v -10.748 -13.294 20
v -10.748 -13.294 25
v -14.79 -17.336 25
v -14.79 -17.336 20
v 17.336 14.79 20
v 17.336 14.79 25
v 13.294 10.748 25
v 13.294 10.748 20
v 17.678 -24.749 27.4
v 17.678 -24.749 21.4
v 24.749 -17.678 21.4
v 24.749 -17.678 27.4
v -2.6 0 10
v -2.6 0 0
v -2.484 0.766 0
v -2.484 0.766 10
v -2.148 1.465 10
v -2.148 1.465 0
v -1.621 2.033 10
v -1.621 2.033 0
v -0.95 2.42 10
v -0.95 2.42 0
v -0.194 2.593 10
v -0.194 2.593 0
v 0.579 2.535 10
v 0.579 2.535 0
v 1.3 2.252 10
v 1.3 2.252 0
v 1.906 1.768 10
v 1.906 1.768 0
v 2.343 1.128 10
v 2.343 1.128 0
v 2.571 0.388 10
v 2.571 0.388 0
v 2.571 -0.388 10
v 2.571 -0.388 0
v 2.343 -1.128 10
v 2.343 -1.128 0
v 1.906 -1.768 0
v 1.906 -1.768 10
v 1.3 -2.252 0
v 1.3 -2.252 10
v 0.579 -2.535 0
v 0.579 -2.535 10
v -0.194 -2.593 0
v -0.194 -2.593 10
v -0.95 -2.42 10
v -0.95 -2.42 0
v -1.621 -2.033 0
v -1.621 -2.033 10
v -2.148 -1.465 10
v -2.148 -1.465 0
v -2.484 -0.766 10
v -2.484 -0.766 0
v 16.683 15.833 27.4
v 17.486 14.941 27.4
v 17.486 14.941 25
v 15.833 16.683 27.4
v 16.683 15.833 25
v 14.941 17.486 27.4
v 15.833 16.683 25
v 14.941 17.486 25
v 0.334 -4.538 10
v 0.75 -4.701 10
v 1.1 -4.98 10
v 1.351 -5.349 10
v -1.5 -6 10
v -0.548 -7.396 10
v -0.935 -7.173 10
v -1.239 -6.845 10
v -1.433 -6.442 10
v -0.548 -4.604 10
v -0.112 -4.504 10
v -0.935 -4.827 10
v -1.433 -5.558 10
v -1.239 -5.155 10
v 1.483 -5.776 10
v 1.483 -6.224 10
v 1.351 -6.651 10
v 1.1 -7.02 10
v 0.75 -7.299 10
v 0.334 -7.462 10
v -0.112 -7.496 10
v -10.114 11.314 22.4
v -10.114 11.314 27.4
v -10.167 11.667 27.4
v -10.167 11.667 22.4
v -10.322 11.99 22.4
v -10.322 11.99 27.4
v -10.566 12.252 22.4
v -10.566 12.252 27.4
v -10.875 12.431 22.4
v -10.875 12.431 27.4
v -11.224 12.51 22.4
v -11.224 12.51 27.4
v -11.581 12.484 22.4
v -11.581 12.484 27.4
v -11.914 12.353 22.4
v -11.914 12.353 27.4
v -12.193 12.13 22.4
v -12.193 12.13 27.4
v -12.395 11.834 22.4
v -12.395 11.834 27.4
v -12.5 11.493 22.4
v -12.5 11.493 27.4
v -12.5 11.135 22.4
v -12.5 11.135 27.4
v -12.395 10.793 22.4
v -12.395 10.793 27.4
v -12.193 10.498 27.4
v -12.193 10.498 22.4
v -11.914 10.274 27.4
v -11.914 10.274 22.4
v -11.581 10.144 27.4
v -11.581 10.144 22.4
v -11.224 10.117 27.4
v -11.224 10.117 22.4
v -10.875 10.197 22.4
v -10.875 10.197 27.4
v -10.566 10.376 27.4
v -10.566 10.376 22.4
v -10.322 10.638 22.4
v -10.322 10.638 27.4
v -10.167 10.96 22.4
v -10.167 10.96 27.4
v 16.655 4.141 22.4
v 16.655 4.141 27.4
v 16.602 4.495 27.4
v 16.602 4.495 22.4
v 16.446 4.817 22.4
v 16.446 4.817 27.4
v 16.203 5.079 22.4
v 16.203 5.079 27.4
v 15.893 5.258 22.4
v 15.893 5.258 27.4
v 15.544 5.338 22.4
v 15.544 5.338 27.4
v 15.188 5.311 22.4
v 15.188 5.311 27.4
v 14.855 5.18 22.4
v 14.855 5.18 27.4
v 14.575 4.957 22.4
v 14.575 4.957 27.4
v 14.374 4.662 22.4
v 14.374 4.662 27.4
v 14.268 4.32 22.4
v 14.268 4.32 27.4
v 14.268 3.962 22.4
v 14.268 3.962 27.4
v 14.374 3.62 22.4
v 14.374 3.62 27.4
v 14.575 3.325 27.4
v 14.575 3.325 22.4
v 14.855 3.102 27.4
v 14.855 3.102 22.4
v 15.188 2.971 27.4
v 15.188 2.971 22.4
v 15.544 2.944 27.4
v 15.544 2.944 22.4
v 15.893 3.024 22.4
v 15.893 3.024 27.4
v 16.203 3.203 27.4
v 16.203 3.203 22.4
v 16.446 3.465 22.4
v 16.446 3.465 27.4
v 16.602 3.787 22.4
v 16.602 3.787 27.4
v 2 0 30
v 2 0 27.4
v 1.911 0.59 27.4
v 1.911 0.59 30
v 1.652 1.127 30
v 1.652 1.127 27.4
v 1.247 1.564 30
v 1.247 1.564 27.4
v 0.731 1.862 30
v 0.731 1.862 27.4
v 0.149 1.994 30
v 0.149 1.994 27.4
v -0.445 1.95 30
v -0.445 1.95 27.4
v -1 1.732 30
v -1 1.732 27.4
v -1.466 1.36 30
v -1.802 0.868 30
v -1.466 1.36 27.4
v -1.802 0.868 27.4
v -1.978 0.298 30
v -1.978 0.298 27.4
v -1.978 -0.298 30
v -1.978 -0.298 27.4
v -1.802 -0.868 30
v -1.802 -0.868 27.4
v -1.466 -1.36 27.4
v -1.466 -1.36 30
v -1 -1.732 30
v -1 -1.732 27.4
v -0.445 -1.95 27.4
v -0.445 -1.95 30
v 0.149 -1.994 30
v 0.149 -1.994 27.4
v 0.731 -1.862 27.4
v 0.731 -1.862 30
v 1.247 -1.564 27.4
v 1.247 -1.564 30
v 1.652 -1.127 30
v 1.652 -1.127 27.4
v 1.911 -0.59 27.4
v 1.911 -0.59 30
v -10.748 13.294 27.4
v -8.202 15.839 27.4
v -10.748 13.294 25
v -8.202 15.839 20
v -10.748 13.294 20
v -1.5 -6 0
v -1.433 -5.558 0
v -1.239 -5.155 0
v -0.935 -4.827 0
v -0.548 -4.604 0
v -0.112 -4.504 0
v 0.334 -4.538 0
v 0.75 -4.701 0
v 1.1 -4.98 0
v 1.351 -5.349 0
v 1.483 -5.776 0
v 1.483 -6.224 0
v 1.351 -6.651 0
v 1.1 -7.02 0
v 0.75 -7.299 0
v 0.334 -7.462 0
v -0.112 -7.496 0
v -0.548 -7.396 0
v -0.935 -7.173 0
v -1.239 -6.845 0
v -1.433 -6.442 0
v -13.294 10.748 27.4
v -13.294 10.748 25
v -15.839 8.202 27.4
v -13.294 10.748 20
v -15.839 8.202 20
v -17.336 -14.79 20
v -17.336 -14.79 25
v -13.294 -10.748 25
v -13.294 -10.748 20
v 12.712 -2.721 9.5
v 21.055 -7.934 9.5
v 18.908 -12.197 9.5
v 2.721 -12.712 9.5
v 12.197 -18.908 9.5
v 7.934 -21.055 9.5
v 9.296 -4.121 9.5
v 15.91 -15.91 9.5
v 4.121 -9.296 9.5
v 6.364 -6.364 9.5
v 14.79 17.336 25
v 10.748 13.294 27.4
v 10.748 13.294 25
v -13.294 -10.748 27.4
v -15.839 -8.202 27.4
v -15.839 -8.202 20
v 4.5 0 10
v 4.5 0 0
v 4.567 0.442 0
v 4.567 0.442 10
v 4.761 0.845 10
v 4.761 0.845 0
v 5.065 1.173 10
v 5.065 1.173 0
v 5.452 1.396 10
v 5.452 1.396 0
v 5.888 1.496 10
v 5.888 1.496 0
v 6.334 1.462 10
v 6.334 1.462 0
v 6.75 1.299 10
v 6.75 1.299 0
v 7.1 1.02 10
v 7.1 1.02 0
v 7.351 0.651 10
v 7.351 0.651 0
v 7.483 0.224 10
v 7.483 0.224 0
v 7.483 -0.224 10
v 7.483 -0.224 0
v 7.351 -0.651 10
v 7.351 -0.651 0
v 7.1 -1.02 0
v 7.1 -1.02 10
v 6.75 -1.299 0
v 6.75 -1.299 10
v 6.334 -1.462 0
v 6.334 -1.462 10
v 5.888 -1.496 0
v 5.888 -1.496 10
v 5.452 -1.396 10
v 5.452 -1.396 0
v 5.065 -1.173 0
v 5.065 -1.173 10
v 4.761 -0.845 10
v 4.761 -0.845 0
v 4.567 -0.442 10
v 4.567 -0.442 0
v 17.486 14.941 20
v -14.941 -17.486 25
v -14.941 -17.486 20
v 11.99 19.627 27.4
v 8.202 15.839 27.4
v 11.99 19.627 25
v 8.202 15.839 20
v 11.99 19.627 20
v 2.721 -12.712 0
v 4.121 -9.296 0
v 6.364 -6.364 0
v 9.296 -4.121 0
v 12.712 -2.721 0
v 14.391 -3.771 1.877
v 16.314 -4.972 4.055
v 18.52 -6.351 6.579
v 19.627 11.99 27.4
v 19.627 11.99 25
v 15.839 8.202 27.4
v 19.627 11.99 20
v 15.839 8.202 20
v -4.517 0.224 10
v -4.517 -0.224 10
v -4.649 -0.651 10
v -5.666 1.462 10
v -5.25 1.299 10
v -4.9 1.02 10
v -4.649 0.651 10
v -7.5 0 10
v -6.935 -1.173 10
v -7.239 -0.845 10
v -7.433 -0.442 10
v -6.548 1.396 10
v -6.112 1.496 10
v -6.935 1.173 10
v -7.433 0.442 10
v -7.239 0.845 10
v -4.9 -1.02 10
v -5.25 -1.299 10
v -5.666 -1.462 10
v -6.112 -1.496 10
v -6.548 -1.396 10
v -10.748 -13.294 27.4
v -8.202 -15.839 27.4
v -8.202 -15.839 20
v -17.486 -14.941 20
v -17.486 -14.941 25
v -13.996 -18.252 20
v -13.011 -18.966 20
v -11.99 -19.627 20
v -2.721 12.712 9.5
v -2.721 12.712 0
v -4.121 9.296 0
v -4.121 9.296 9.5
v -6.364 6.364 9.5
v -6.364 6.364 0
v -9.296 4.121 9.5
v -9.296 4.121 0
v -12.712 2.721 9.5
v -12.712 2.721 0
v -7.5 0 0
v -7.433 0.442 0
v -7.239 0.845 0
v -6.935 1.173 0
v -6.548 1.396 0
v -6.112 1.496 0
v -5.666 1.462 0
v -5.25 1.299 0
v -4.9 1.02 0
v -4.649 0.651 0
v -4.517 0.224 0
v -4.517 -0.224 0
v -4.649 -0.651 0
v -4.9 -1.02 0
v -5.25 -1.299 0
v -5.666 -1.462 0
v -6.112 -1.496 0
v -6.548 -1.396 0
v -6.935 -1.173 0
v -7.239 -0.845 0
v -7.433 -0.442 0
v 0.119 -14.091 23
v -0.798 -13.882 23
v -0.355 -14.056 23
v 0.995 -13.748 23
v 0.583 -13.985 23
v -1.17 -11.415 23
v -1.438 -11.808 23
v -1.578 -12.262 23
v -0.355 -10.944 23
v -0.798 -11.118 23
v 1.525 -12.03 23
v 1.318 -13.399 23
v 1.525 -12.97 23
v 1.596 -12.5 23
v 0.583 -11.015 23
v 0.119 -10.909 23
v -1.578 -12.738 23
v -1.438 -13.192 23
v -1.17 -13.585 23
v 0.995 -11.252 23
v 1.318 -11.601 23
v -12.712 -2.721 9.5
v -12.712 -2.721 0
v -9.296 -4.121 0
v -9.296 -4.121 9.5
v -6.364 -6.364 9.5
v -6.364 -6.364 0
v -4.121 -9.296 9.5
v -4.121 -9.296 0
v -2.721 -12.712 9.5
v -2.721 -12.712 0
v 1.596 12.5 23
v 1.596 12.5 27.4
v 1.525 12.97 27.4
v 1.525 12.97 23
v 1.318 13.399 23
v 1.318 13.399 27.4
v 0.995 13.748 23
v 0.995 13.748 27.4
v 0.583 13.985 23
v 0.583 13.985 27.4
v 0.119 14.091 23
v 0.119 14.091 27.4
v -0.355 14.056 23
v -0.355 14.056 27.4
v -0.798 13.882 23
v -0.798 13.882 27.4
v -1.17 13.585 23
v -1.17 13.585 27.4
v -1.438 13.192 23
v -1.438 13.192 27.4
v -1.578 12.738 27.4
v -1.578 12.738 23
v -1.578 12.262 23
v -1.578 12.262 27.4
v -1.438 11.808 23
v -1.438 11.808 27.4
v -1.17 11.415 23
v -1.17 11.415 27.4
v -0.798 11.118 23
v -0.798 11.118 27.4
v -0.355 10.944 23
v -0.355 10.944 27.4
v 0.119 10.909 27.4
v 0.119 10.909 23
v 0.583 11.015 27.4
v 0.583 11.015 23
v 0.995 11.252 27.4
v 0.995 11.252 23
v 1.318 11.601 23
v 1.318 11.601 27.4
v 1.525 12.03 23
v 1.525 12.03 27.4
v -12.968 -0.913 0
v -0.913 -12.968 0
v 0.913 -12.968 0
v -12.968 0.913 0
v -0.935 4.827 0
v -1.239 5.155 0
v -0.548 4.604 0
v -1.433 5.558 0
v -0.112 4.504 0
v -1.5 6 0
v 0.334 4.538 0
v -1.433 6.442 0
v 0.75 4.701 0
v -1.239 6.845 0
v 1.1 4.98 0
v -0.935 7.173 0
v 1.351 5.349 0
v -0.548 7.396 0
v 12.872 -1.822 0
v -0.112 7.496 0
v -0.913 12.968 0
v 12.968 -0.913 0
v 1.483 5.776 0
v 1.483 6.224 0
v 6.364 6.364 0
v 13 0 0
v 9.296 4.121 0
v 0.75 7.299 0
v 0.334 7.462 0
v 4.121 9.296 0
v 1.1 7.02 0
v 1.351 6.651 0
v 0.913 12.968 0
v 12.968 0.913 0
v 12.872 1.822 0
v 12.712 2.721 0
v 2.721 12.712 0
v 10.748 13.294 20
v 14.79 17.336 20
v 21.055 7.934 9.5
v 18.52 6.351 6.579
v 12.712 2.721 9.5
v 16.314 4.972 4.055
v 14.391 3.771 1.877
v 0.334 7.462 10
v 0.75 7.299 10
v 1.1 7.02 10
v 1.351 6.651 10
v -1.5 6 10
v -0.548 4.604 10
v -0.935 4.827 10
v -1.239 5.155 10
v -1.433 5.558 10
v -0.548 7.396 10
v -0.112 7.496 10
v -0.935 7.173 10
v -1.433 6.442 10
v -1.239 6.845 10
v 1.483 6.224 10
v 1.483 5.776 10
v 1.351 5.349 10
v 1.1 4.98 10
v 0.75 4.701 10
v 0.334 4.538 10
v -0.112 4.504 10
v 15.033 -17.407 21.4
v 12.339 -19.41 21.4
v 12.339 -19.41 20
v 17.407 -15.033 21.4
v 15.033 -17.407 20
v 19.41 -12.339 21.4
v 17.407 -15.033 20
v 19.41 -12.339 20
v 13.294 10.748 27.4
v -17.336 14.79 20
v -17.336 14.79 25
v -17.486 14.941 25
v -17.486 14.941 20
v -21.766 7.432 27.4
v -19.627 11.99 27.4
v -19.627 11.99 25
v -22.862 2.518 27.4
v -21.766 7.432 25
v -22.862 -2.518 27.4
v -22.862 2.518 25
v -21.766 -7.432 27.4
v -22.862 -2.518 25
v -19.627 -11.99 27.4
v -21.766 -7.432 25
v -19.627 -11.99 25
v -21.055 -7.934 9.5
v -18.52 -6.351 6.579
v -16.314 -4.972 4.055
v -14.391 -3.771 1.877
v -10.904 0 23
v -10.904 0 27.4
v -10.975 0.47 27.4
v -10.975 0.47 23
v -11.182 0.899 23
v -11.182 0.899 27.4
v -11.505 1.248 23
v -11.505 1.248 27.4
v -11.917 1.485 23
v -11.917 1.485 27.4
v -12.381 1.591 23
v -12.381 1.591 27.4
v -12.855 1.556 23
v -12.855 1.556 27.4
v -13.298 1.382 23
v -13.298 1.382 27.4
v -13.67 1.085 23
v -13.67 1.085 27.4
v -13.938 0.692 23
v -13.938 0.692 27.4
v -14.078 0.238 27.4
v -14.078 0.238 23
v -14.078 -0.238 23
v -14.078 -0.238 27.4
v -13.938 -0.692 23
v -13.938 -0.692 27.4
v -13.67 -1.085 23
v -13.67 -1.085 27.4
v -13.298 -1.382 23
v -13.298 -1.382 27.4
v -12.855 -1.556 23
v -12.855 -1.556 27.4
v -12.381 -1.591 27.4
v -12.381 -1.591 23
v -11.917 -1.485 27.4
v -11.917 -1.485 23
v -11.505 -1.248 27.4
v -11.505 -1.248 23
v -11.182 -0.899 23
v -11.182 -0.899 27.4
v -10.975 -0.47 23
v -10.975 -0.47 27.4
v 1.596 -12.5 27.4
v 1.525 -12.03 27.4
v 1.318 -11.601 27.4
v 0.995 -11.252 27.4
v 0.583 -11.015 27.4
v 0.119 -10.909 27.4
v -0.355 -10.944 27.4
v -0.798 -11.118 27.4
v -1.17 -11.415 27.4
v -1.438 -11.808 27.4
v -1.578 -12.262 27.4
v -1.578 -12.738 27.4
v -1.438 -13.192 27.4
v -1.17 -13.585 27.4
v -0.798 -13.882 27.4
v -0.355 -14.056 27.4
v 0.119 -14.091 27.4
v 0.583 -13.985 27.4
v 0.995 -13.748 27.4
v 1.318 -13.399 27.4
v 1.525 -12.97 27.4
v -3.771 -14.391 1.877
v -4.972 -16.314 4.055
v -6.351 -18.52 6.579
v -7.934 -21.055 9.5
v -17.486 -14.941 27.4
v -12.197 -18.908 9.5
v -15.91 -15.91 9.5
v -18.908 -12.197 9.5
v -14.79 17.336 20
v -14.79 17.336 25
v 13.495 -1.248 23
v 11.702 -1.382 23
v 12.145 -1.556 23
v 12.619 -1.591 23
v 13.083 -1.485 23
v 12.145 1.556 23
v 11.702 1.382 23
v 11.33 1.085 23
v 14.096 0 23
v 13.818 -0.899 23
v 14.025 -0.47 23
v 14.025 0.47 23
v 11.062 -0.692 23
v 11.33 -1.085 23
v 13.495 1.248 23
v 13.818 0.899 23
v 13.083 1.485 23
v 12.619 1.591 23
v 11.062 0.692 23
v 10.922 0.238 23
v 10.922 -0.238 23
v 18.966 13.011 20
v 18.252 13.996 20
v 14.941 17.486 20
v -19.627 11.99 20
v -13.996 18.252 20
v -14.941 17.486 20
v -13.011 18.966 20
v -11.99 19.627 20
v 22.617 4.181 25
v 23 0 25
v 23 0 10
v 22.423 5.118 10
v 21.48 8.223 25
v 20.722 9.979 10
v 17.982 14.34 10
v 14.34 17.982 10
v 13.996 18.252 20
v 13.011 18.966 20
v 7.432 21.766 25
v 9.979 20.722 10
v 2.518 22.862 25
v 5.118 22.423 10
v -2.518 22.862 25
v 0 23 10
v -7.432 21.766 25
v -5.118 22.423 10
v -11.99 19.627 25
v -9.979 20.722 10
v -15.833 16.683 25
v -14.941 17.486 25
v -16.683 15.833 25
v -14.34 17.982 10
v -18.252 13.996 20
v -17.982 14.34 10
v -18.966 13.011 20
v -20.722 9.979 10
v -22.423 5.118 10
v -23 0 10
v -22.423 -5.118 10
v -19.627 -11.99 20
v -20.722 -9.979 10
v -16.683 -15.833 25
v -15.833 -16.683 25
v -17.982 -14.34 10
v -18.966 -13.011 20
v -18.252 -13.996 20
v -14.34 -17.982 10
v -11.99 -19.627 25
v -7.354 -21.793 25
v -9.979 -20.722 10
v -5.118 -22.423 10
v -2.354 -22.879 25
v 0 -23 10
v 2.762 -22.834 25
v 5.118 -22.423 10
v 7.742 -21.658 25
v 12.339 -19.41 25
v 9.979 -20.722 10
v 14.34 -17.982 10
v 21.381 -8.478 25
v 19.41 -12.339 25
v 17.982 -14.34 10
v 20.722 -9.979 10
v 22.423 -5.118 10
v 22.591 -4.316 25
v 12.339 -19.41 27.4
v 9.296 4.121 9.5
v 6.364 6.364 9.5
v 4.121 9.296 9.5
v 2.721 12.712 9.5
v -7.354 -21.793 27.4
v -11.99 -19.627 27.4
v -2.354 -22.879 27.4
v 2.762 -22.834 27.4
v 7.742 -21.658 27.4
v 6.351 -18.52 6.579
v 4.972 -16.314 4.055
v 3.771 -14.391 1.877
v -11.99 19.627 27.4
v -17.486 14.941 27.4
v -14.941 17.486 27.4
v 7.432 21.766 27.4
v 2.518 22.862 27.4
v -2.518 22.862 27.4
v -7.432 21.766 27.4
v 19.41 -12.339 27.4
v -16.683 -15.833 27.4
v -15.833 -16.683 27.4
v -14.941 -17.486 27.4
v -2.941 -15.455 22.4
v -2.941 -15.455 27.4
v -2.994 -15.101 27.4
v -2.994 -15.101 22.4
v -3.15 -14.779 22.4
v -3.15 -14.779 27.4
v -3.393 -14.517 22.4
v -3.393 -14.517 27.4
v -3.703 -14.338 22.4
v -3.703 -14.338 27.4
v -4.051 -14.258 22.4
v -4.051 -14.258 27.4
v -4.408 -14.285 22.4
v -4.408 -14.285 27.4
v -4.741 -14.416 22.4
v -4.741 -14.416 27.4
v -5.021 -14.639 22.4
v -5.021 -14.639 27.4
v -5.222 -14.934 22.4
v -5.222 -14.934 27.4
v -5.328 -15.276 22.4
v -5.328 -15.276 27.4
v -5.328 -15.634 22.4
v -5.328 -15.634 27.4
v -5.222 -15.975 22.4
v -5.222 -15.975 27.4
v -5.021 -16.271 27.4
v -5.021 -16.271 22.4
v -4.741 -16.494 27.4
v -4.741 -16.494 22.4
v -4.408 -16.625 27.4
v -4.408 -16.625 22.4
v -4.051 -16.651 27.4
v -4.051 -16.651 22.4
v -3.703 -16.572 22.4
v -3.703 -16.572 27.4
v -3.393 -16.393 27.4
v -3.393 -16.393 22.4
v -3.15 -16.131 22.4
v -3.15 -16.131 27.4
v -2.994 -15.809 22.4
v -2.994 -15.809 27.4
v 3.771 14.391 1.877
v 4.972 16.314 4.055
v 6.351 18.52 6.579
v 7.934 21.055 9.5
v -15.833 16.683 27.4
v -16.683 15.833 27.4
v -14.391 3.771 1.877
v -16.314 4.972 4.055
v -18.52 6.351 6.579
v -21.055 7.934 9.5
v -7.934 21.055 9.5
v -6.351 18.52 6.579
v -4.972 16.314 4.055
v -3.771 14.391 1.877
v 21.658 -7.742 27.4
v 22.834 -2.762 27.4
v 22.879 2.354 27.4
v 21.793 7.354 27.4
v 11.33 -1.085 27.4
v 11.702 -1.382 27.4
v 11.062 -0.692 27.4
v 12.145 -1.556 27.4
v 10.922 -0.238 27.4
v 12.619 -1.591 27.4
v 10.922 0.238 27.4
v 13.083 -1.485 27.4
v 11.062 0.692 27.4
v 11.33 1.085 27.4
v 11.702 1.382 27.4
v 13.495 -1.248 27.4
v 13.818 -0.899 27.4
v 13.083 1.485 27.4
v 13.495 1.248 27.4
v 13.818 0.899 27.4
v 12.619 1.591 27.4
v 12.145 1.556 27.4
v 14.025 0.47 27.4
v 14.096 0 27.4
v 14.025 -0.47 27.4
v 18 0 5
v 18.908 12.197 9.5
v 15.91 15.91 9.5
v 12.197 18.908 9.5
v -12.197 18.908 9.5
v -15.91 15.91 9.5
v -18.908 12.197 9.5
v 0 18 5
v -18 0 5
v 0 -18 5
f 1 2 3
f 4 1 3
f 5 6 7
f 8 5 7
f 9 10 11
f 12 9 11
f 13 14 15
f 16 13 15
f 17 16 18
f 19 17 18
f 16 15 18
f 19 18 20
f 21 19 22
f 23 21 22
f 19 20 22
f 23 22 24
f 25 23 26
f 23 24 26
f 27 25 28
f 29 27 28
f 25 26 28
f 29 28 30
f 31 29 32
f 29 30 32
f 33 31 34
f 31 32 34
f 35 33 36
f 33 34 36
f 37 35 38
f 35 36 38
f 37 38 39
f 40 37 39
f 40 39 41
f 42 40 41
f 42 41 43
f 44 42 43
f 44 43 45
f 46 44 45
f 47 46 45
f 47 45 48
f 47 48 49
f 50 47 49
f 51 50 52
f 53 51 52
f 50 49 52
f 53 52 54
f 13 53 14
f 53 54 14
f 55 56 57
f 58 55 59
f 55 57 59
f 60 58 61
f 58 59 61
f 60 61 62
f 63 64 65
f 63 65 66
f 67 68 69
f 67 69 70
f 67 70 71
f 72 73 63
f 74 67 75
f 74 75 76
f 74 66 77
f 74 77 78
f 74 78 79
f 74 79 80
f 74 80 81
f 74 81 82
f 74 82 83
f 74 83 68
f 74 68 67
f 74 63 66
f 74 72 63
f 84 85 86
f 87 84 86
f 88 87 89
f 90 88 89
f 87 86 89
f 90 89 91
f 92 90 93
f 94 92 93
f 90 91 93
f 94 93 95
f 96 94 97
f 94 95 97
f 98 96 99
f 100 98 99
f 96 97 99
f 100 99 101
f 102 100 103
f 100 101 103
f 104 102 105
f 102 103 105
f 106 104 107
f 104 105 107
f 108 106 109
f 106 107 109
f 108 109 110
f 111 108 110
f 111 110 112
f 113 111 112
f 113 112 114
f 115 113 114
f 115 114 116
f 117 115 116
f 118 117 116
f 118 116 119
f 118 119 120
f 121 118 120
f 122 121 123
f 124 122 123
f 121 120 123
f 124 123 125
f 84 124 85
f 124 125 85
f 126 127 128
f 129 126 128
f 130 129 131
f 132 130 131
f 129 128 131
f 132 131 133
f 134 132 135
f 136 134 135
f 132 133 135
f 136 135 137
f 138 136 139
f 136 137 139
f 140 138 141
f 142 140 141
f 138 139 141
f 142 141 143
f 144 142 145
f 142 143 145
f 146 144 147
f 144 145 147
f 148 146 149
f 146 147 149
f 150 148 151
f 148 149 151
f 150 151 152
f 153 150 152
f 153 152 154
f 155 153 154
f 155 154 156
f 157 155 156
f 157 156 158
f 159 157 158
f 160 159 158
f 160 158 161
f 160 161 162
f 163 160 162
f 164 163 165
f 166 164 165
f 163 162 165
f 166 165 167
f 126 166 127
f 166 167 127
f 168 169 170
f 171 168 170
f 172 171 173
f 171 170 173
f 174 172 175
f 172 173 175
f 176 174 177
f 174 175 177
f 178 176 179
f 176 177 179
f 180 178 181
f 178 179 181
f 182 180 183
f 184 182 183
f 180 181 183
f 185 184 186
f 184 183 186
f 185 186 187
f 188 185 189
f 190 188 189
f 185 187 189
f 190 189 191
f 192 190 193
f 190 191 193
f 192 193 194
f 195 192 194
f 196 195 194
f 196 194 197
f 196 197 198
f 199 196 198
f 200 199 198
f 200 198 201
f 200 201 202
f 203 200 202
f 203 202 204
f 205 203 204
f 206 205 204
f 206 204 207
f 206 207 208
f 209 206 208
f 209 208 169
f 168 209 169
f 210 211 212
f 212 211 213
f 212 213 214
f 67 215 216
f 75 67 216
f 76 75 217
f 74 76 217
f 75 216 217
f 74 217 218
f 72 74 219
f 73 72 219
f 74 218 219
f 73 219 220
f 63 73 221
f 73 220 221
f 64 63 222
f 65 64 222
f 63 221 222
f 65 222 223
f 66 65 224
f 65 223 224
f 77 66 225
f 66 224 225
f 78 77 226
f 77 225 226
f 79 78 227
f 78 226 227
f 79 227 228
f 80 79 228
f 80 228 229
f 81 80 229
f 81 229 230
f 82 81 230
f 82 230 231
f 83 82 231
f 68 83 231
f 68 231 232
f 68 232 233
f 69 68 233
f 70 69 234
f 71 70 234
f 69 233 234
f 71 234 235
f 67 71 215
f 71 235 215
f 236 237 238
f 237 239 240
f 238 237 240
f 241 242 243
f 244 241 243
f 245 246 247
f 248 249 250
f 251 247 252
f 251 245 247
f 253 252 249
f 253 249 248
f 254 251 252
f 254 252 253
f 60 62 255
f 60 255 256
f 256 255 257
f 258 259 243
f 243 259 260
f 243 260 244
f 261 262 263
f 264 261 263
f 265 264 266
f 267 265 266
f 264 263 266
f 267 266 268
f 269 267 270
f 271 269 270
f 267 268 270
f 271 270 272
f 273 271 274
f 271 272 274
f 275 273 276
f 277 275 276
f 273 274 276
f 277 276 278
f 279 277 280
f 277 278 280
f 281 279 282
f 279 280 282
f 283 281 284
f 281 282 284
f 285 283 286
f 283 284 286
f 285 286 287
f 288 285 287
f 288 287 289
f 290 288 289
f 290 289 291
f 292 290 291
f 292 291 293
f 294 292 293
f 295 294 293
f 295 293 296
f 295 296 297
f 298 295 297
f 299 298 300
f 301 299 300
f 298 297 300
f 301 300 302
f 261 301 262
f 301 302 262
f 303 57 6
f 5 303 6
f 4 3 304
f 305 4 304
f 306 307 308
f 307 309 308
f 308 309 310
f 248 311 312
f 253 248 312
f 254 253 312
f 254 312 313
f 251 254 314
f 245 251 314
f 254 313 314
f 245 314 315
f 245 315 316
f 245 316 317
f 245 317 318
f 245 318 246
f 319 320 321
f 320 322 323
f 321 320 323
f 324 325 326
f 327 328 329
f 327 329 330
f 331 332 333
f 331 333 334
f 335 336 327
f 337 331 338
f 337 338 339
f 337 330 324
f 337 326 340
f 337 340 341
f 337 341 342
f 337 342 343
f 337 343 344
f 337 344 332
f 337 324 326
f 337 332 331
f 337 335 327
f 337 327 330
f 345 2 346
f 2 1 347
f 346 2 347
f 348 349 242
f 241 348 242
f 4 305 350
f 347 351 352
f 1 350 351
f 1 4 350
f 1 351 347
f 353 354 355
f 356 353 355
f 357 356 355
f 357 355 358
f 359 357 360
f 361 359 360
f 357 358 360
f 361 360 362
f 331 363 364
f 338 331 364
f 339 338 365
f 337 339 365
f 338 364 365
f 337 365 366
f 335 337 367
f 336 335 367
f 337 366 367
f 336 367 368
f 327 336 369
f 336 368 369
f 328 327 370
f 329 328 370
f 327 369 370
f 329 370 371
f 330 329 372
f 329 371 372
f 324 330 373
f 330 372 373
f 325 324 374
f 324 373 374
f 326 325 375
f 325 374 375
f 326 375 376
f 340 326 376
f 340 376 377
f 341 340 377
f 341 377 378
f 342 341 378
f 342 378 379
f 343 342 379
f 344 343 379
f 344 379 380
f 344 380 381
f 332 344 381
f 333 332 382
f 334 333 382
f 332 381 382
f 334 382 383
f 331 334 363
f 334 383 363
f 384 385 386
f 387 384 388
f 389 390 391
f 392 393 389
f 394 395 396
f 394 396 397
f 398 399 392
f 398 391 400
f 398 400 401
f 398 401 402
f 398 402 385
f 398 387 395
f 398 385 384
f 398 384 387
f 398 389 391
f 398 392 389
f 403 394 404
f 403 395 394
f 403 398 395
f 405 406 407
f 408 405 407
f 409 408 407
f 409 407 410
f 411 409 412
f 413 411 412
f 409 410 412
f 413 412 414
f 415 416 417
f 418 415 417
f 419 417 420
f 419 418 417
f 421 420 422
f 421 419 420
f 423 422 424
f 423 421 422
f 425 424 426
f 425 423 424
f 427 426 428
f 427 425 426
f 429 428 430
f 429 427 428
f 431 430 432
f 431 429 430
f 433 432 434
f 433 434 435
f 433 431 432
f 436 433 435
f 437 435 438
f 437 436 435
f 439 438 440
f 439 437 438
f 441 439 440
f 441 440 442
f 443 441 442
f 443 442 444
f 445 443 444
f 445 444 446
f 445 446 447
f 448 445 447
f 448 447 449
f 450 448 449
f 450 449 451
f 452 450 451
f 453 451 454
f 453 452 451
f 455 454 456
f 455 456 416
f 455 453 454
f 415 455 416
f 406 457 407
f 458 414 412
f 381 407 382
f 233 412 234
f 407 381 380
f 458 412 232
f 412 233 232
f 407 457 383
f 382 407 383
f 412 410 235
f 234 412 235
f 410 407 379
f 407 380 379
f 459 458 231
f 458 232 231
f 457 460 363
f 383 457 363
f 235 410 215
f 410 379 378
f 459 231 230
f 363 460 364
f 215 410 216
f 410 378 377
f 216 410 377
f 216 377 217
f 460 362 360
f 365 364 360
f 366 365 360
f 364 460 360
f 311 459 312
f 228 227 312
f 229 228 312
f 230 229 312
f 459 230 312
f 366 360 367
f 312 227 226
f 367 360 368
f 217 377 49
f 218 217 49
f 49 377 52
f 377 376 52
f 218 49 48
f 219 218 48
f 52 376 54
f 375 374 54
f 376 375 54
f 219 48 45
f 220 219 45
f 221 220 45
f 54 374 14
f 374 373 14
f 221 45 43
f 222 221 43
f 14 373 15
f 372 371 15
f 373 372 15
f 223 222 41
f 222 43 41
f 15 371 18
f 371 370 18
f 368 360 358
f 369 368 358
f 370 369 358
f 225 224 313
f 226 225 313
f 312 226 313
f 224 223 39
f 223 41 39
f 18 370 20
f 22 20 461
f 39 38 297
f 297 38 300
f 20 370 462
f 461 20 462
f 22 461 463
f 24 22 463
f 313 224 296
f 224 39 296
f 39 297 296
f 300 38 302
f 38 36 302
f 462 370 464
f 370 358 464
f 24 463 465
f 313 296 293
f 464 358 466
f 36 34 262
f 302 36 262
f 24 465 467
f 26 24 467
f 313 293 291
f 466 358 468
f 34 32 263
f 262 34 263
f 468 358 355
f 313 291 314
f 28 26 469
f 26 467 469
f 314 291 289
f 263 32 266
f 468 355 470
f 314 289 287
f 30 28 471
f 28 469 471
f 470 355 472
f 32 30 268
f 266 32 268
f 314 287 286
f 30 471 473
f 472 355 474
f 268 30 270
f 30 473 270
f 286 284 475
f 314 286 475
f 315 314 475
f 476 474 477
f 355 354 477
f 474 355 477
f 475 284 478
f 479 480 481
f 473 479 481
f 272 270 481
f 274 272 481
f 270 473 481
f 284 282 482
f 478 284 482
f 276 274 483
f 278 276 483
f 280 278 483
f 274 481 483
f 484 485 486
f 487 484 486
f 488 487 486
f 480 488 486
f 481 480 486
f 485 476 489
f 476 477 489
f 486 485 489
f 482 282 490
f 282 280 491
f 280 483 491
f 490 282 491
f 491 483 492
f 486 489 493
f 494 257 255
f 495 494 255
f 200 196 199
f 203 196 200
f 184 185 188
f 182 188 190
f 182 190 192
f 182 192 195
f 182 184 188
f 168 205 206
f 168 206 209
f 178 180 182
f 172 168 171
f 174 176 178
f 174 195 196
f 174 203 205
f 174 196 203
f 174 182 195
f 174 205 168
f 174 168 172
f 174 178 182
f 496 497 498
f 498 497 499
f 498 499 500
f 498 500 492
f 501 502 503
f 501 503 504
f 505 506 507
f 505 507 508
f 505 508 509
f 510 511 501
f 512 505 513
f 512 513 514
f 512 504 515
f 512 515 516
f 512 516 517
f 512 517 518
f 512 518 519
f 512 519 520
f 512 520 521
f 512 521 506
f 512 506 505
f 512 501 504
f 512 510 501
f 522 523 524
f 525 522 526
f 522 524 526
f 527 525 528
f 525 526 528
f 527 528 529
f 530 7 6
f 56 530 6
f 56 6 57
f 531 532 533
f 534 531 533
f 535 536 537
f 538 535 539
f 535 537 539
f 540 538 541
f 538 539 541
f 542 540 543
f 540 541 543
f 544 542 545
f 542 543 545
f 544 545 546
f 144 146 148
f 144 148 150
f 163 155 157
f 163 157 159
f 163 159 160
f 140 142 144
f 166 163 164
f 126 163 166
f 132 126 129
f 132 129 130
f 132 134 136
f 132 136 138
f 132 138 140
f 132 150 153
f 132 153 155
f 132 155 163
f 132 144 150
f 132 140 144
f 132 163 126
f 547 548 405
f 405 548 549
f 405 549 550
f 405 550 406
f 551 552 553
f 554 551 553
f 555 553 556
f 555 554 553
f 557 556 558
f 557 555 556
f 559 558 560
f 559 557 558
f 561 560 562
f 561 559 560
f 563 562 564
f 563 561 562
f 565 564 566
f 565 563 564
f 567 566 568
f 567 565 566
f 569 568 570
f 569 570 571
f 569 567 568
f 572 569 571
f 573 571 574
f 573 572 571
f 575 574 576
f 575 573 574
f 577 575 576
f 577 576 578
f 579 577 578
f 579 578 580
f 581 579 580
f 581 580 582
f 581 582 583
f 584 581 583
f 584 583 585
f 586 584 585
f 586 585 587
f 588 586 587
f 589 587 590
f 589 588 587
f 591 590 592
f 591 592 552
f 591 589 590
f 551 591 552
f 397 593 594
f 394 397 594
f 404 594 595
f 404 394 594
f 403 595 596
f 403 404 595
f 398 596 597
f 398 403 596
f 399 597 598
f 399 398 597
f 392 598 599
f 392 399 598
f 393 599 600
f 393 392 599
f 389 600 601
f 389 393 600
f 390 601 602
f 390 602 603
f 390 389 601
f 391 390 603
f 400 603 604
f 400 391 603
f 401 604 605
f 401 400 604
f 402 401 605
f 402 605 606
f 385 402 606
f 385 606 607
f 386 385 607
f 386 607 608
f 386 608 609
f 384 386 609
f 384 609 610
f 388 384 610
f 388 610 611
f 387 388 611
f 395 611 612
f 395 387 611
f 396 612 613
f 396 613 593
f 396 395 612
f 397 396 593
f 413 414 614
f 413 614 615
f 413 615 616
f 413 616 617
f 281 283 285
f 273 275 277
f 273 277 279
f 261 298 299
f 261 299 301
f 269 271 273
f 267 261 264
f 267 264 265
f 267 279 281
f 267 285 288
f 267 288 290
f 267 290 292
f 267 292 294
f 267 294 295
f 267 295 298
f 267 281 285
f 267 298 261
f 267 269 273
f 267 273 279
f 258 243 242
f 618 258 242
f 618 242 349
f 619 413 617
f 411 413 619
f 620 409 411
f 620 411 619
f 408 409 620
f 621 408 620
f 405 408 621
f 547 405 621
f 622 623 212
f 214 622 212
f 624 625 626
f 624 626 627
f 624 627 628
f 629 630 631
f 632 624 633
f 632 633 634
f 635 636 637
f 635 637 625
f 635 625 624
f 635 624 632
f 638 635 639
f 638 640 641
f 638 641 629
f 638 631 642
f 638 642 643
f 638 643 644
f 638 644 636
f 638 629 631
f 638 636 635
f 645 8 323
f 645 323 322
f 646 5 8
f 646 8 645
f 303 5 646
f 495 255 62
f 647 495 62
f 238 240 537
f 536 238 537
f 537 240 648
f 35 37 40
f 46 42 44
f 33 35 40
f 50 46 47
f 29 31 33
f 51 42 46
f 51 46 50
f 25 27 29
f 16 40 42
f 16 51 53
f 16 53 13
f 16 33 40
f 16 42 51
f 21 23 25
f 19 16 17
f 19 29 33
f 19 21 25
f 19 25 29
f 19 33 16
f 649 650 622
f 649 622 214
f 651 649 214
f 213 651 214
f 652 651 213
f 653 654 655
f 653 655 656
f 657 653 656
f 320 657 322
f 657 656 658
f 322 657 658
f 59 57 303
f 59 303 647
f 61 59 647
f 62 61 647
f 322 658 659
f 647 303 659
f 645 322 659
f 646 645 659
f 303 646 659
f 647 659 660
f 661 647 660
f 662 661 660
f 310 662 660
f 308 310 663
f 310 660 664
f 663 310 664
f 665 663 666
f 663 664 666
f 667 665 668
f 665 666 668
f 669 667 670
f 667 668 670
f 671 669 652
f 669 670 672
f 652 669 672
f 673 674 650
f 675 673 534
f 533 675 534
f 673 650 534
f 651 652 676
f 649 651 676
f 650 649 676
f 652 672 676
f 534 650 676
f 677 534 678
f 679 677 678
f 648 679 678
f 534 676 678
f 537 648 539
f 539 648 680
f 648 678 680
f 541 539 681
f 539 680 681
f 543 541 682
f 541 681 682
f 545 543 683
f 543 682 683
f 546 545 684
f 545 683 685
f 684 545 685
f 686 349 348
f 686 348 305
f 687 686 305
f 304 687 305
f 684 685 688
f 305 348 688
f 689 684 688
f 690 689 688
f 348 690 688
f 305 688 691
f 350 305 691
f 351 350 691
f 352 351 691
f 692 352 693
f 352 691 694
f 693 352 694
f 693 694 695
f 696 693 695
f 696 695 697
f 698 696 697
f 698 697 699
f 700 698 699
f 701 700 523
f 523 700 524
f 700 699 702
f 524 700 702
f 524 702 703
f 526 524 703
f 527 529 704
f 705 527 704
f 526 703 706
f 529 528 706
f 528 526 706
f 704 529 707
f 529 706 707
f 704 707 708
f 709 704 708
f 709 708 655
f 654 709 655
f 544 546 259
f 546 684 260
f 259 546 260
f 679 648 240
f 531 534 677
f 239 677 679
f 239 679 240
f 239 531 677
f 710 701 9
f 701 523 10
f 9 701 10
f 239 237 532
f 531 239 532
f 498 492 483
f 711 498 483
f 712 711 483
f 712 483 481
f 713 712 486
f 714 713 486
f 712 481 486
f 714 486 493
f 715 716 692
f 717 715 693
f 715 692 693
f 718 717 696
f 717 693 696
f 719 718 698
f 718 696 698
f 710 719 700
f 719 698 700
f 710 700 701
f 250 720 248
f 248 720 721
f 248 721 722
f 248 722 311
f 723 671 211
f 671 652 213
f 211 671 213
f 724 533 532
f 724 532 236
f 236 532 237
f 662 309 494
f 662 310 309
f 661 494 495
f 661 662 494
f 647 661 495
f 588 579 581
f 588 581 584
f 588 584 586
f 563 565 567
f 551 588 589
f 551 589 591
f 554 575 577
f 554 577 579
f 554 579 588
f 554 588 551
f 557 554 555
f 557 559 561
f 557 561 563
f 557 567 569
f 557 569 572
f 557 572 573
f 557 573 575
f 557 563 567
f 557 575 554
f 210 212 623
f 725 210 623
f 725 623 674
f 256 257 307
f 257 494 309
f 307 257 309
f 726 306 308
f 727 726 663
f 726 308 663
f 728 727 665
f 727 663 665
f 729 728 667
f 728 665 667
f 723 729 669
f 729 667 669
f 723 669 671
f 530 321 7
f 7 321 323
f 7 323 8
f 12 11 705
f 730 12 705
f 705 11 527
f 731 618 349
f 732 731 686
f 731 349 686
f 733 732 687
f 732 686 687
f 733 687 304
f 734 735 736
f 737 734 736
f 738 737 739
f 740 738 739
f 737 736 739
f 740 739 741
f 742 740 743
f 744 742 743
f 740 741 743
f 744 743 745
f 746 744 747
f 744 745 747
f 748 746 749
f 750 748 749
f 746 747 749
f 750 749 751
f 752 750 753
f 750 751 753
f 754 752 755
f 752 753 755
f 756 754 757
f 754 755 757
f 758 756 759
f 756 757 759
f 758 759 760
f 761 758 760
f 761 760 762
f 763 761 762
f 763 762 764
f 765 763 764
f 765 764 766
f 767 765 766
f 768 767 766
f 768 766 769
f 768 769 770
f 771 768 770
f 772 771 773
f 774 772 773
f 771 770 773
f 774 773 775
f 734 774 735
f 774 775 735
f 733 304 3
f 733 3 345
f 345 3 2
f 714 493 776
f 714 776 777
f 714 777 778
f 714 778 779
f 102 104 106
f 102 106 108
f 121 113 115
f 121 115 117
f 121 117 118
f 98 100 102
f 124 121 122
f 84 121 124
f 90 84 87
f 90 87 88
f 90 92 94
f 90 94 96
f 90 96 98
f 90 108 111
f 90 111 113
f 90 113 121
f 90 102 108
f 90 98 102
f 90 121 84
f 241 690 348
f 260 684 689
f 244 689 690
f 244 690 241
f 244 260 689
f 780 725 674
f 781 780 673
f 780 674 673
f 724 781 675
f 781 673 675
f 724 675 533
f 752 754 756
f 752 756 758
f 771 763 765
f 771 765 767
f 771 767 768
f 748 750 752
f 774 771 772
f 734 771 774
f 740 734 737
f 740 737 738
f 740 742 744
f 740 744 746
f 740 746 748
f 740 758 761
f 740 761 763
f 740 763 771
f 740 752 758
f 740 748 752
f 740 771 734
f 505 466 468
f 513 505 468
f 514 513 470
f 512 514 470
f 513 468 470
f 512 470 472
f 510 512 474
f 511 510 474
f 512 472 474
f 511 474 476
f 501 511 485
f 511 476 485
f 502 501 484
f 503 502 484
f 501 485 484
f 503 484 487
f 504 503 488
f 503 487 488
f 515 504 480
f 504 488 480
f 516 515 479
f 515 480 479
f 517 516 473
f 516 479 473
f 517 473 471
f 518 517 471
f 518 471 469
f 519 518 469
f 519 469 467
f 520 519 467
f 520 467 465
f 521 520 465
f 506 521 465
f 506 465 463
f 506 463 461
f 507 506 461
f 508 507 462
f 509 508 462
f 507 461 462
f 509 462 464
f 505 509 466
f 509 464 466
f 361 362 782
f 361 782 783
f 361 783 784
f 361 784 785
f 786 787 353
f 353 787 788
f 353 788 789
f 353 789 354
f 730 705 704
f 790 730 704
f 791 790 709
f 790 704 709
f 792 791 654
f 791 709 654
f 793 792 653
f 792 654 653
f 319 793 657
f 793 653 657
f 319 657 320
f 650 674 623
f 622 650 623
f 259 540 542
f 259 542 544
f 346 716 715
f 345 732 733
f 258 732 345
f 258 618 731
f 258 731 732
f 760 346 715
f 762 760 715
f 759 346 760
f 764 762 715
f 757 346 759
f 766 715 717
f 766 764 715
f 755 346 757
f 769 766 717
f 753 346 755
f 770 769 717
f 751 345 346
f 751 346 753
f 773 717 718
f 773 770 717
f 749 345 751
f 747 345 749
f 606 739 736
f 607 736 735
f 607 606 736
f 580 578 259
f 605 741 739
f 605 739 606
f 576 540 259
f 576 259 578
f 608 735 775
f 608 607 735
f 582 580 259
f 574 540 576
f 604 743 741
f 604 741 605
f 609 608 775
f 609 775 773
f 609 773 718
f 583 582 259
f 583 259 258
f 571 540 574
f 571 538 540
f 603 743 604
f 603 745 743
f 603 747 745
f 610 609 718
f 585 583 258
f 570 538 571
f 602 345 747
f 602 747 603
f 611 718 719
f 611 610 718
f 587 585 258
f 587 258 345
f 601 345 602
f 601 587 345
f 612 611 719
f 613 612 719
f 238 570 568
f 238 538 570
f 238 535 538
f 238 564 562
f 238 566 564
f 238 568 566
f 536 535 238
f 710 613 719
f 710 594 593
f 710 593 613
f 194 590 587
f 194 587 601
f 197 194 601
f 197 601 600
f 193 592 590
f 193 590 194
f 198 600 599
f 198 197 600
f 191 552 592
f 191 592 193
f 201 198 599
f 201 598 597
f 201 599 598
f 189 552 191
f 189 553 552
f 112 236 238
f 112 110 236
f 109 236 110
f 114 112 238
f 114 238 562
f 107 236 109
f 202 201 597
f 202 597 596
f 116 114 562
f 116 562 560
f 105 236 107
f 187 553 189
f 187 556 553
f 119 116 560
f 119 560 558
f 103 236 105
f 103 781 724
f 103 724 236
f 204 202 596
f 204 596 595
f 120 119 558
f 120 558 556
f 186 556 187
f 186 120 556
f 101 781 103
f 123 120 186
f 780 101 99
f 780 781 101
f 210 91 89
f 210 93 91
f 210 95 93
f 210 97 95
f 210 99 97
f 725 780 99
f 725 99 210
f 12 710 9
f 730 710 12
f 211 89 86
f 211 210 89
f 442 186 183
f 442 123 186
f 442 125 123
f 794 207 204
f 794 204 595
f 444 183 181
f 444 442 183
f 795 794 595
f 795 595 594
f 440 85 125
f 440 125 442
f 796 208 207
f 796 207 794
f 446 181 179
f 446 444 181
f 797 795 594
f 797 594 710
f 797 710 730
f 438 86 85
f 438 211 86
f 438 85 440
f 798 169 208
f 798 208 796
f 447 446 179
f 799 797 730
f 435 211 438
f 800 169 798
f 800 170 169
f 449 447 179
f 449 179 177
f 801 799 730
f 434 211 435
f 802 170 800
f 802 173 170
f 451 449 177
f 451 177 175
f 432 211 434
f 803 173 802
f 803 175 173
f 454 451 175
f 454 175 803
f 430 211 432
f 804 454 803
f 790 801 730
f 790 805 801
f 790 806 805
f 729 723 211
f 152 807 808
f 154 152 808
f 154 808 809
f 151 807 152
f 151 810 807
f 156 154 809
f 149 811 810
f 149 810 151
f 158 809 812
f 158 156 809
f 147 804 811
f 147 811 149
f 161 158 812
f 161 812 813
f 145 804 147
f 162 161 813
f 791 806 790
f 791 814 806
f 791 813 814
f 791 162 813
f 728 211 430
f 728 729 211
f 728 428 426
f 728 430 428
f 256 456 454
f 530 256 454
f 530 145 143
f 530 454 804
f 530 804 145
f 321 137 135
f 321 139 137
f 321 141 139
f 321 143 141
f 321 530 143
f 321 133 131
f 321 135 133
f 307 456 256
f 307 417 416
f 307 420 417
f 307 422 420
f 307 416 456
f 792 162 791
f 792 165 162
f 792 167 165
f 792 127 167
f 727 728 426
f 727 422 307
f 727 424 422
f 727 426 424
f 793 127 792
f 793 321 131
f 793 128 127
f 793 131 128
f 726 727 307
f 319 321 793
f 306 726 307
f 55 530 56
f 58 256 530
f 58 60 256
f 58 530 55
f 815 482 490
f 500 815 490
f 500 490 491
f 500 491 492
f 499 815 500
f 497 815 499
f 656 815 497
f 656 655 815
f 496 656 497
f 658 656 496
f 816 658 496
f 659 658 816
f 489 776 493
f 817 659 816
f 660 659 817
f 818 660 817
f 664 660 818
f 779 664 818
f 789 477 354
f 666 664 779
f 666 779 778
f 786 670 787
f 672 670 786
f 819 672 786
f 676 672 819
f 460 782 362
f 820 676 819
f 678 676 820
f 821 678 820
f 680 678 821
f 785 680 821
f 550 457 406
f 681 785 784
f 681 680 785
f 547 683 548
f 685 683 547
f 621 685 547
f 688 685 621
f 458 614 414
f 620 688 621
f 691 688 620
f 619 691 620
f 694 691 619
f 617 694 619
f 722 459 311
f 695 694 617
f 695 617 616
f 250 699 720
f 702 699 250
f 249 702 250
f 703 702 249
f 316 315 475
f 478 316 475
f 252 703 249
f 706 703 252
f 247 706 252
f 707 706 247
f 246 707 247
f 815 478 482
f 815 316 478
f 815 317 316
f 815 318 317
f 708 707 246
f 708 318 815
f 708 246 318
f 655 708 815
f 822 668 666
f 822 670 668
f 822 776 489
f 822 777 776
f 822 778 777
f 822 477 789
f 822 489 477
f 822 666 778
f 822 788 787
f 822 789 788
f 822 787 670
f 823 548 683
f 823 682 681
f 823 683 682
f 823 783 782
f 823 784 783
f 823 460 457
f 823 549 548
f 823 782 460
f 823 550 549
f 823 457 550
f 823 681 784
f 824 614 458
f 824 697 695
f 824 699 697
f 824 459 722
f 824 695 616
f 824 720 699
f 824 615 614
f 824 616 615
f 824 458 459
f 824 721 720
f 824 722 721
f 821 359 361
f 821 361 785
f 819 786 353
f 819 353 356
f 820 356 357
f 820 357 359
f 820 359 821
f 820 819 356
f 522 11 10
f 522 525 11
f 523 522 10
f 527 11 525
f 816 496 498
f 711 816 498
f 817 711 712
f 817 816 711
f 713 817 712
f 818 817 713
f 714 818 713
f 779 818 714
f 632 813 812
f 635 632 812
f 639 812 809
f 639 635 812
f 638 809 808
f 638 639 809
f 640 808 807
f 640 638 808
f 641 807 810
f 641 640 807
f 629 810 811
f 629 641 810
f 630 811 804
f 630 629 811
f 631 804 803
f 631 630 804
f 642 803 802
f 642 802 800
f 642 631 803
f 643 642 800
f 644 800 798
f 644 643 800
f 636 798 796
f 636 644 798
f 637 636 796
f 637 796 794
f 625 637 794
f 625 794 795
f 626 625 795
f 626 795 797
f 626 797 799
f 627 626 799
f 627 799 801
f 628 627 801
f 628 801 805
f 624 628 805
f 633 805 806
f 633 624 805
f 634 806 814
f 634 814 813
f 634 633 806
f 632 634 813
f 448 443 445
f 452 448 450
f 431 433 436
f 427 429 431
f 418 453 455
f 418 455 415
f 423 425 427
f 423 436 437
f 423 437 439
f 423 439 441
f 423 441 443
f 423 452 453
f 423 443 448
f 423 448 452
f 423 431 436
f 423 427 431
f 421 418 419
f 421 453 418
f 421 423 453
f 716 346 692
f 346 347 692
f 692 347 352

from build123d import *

# Parameters (mm, degrees)
SKETCH_1_R          = 23
EXTRUDE_1_DEPTH     = 25
SKETCH_2_R          = 1.5
SKETCH_2_R_2        = 2.6
CUT_EXTRUDE_1_DEPTH = 10
SKETCH_3_R          = 2.6
EXTRUDE_2_DEPTH     = 27
CHAMFER_1_SIZE      = 10
CUT_EXTRUDE_2_DEPTH = 9.5
SKETCH_5_R          = 1.595744681
CUT_EXTRUDE_3_DEPTH = 2
SKETCH_6_R          = 2.6
CUT_EXTRUDE_4_DEPTH = 12
SKETCH_7_R          = 2
EXTRUDE_3_DEPTH     = 5
EXTRUDE_4_DEPTH     = 5
CUT_EXTRUDE_5_DEPTH = 5
SKETCH_10_R         = 1.595744681
EXTRUDE_5_DEPTH     = 2.4
CUT_EXTRUDE_6_DEPTH = 1.4
SKETCH_12_R         = 1.2
CUT_EXTRUDE_7_DEPTH = 5


with BuildPart() as part:
    # 草图1 → 凸台-拉伸1 (new body)
    with BuildSketch(Plane.XY):
        Circle(SKETCH_1_R)
    extrude(amount=EXTRUDE_1_DEPTH)

    # 草图2 → 切除-拉伸1 (cut)
    with BuildSketch(Plane(origin=(0, 0, 0), x_dir=(-1, 0, 0), z_dir=(0, 0, -1))):
        with Locations((6, 0)):
            Circle(SKETCH_2_R)
        with Locations((0, -6)):
            Circle(SKETCH_2_R)
        with Locations((-6, 0)):
            Circle(SKETCH_2_R)
        with Locations((0, 6)):
            Circle(SKETCH_2_R)
        Circle(SKETCH_2_R_2)
    extrude(amount=-CUT_EXTRUDE_1_DEPTH, mode=Mode.SUBTRACT)

    # 草图3 → 凸台-拉伸2 (add)
    with BuildSketch(Plane(origin=(0, 0, 10), x_dir=(-1, 0, 0), z_dir=(0, 0, -1))):
        Circle(SKETCH_3_R)
    extrude(amount=-EXTRUDE_2_DEPTH)

    # 倒角1
    chamfer_1_edges = [part.edges().sort_by_distance(p)[0] for p in [
        (-23, 0, 0),
    ]]
    chamfer(chamfer_1_edges, length=CHAMFER_1_SIZE)

    # 草图4 → 切除-拉伸2 (cut)
    with BuildSketch(Plane(origin=(0, 0, 0), x_dir=(-1, 0, 0), z_dir=(0, 0, -1))):
        with BuildLine():
            ThreePointArc((3.800832161, -12.431961828), (3.264127324, -12.583539757), (2.72141518, -12.711958913))
            Line((2.72141518, -12.711958913), (8.204578209, -21.486854037))
            ThreePointArc((8.204578209, -21.486854037), (16.263455967, -16.263455967), (21.486854037, -8.204578209))
            Line((21.486854037, -8.204578209), (12.711958913, -2.72141518))
            ThreePointArc((12.711958913, -2.72141518), (9.578191182, -8.789667439), (3.800832161, -12.431961828))
        make_face()
        with BuildLine():
            ThreePointArc((12.711958913, -2.72141518), (6.363961031, -6.363961031), (2.72141518, -12.711958913))
            ThreePointArc((2.72141518, -12.711958913), (3.264127324, -12.583539757), (3.800832161, -12.431961828))
            ThreePointArc((3.800832161, -12.431961828), (9.578191182, -8.789667439), (12.711958913, -2.72141518))
        make_face()
        with BuildLine():
            ThreePointArc((2.72141518, 12.711958913), (6.363961031, 6.363961031), (12.711958913, 2.72141518))
            ThreePointArc((12.711958913, 2.72141518), (9.192388155, 9.192388155), (2.72141518, 12.711958913))
        make_face()
        with BuildLine():
            ThreePointArc((2.72141518, 12.711958913), (9.192388155, 9.192388155), (12.711958913, 2.72141518))
            Line((12.711958913, 2.72141518), (21.486854037, 8.204578209))
            ThreePointArc((21.486854037, 8.204578209), (16.263455967, 16.263455967), (8.204578209, 21.486854037))
            Line((8.204578209, 21.486854037), (2.72141518, 12.711958913))
        make_face()
        with BuildLine():
            Line((-21.486854037, 8.204578209), (-12.711958913, 2.72141518))
            ThreePointArc((-12.711958913, 2.72141518), (-9.192388155, 9.192388155), (-2.72141518, 12.711958913))
            Line((-2.72141518, 12.711958913), (-8.204578209, 21.486854037))
            ThreePointArc((-8.204578209, 21.486854037), (-16.263455967, 16.263455967), (-21.486854037, 8.204578209))
        make_face()
        with BuildLine():
            ThreePointArc((-2.72141518, 12.711958913), (-9.192388155, 9.192388155), (-12.711958913, 2.72141518))
            ThreePointArc((-12.711958913, 2.72141518), (-6.363961031, 6.363961031), (-2.72141518, 12.711958913))
        make_face()
        with BuildLine():
            Line((-8.204578209, -21.486854037), (-2.72141518, -12.711958913))
            ThreePointArc((-2.72141518, -12.711958913), (-9.192388155, -9.192388155), (-12.711958913, -2.72141518))
            Line((-12.711958913, -2.72141518), (-21.486854037, -8.204578209))
            ThreePointArc((-21.486854037, -8.204578209), (-16.263455967, -16.263455967), (-8.204578209, -21.486854037))
        make_face()
        with BuildLine():
            ThreePointArc((-12.711958913, -2.72141518), (-9.192388155, -9.192388155), (-2.72141518, -12.711958913))
            ThreePointArc((-2.72141518, -12.711958913), (-6.363961031, -6.363961031), (-12.711958913, -2.72141518))
        make_face()
    extrude(amount=-CUT_EXTRUDE_2_DEPTH, mode=Mode.SUBTRACT)

    # 草图5 → 切除-拉伸3 (cut)
    with BuildSketch(Plane.XY.offset(25)):
        with Locations((0, 12.5)):
            Circle(SKETCH_5_R)
        with Locations((12.5, 0)):
            Circle(SKETCH_5_R)
        with Locations((0, -12.5)):
            Circle(SKETCH_5_R)
        with Locations((-12.5, 0)):
            Circle(SKETCH_5_R)
    extrude(amount=-CUT_EXTRUDE_3_DEPTH, mode=Mode.SUBTRACT)

    # 草图6 → 切除-拉伸4 (cut)
    with BuildSketch(Plane.XY.offset(37)):
        Circle(SKETCH_6_R)
    extrude(amount=-CUT_EXTRUDE_4_DEPTH, mode=Mode.SUBTRACT)

    # 草图7 → 凸台-拉伸3 (add)
    with BuildSketch(Plane.XY.offset(25)):
        Circle(SKETCH_7_R)
    extrude(amount=EXTRUDE_3_DEPTH)

    # 草图8 → 凸台-拉伸4 (add)
    with BuildSketch(Plane.XY.offset(25)):
        Polygon((17.67766953, -24.748737342), (24.748737342, -17.67766953), (17.597575781, -10.526507969), (10.526507969, -17.597575781), align=None)
    extrude(amount=-EXTRUDE_4_DEPTH)

    # 草图9 → 切除-拉伸5 (cut)
    with BuildSketch(Plane.XY.offset(25)):
        with BuildLine():
            Line((-17.335793171, 14.790208759), (-17.486366766, 14.940782353))
            ThreePointArc((-17.486366766, 14.940782353), (-18.615341136, 13.50811143), (-19.627234895, 11.990481658))
            Line((-19.627234895, 11.990481658), (-15.839191899, 8.202438662))
            Line((-15.839191899, 8.202438662), (-13.293607486, 10.748023074))
            Line((-13.293607486, 10.748023074), (-17.335793171, 14.790208759))
        make_face()
        with BuildLine():
            Line((-8.202438662, 15.839191899), (-11.990481658, 19.627234895))
            ThreePointArc((-11.990481658, 19.627234895), (-13.50811143, 18.615341136), (-14.940782353, 17.486366766))
            Line((-14.940782353, 17.486366766), (-14.790208759, 17.335793171))
            Line((-14.790208759, 17.335793171), (-10.748023074, 13.293607486))
            Line((-10.748023074, 13.293607486), (-8.202438662, 15.839191899))
        make_face()
        with BuildLine():
            Line((8.202438662, 15.839191899), (10.748023074, 13.293607486))
            Line((10.748023074, 13.293607486), (14.790208759, 17.335793171))
            Line((14.790208759, 17.335793171), (14.940782353, 17.486366766))
            ThreePointArc((14.940782353, 17.486366766), (13.50811143, 18.615341136), (11.990481658, 19.627234895))
            Line((11.990481658, 19.627234895), (8.202438662, 15.839191899))
        make_face()
        with BuildLine():
            ThreePointArc((19.627234895, 11.990481658), (18.615341136, 13.50811143), (17.486366766, 14.940782353))
            Line((17.486366766, 14.940782353), (17.335793171, 14.790208759))
            Line((17.335793171, 14.790208759), (13.293607486, 10.748023074))
            Line((13.293607486, 10.748023074), (15.839191899, 8.202438662))
            Line((15.839191899, 8.202438662), (19.627234895, 11.990481658))
        make_face()
        with BuildLine():
            Line((-14.790208759, -17.335793171), (-14.940782353, -17.486366766))
            ThreePointArc((-14.940782353, -17.486366766), (-13.50811143, -18.615341136), (-11.990481658, -19.627234895))
            Line((-11.990481658, -19.627234895), (-8.202438662, -15.839191899))
            Line((-8.202438662, -15.839191899), (-10.748023074, -13.293607486))
            Line((-10.748023074, -13.293607486), (-14.790208759, -17.335793171))
        make_face()
        with BuildLine():
            Line((-15.839191899, -8.202438662), (-19.627234895, -11.990481658))
            ThreePointArc((-19.627234895, -11.990481658), (-18.615341136, -13.50811143), (-17.486366766, -14.940782353))
            Line((-17.486366766, -14.940782353), (-17.335793171, -14.790208759))
            Line((-17.335793171, -14.790208759), (-13.293607486, -10.748023074))
            Line((-13.293607486, -10.748023074), (-15.839191899, -8.202438662))
        make_face()
    extrude(amount=-CUT_EXTRUDE_5_DEPTH, mode=Mode.SUBTRACT)

    # 草图10 → 凸台-拉伸5 (add)
    with BuildSketch(Plane.XY.offset(25)):
        with BuildLine():
            Line((-10.748023074, -13.293607486), (-8.202438662, -15.839191899))
            Line((-8.202438662, -15.839191899), (-11.990481658, -19.627234895))
            ThreePointArc((-11.990481658, -19.627234895), (0.205316668, -22.99908357), (12.33897396, -19.410041772))
            Line((12.33897396, -19.410041772), (17.67766953, -24.748737342))
            Line((17.67766953, -24.748737342), (24.748737342, -17.67766953))
            Line((24.748737342, -17.67766953), (19.410041772, -12.33897396))
            ThreePointArc((19.410041772, -12.33897396), (22.99908357, -0.205316668), (19.627234895, 11.990481658))
            Line((19.627234895, 11.990481658), (15.839191899, 8.202438662))
            Line((15.839191899, 8.202438662), (13.293607486, 10.748023074))
            Line((13.293607486, 10.748023074), (17.486366766, 14.940782353))
            ThreePointArc((17.486366766, 14.940782353), (16.263455967, 16.263455967), (14.940782353, 17.486366766))
            Line((14.940782353, 17.486366766), (10.748023074, 13.293607486))
            Line((10.748023074, 13.293607486), (8.202438662, 15.839191899))
            Line((8.202438662, 15.839191899), (11.990481658, 19.627234895))
            ThreePointArc((11.990481658, 19.627234895), (0, 23), (-11.990481658, 19.627234895))
            Line((-11.990481658, 19.627234895), (-8.202438662, 15.839191899))
            Line((-8.202438662, 15.839191899), (-10.748023074, 13.293607486))
            Line((-10.748023074, 13.293607486), (-14.940782353, 17.486366766))
            ThreePointArc((-14.940782353, 17.486366766), (-16.263455967, 16.263455967), (-17.486366766, 14.940782353))
            Line((-17.486366766, 14.940782353), (-13.293607486, 10.748023074))
            Line((-13.293607486, 10.748023074), (-15.839191899, 8.202438662))
            Line((-15.839191899, 8.202438662), (-19.627234895, 11.990481658))
            ThreePointArc((-19.627234895, 11.990481658), (-23, 0), (-19.627234895, -11.990481658))
            Line((-19.627234895, -11.990481658), (-15.839191899, -8.202438662))
            Line((-15.839191899, -8.202438662), (-13.293607486, -10.748023074))
            Line((-13.293607486, -10.748023074), (-17.486366766, -14.940782353))
            ThreePointArc((-17.486366766, -14.940782353), (-16.263455967, -16.263455967), (-14.940782353, -17.486366766))
            Line((-14.940782353, -17.486366766), (-10.748023074, -13.293607486))
        make_face()
        with Locations((0, 12.5)):
            Circle(SKETCH_10_R, mode=Mode.SUBTRACT)
        with Locations((-12.5, 0)):
            Circle(SKETCH_10_R, mode=Mode.SUBTRACT)
        with Locations((0, -12.5)):
            Circle(SKETCH_10_R, mode=Mode.SUBTRACT)
        with Locations((12.5, 0)):
            Circle(SKETCH_10_R, mode=Mode.SUBTRACT)
    extrude(amount=EXTRUDE_5_DEPTH)

    # 草图11 → 切除-拉伸6 (cut)
    with BuildSketch(Plane(origin=(0, 0, 20), x_dir=(-1, 0, 0), z_dir=(0, 0, -1))):
        with BuildLine():
            Line((-17.67766953, -24.748737342), (-12.33897396, -19.410041772))
            ThreePointArc((-12.33897396, -19.410041772), (-16.263455967, -16.263455967), (-19.410041772, -12.33897396))
            Line((-19.410041772, -12.33897396), (-24.748737342, -17.67766953))
            Line((-24.748737342, -17.67766953), (-17.67766953, -24.748737342))
        make_face()
    extrude(amount=-CUT_EXTRUDE_6_DEPTH, mode=Mode.SUBTRACT)

    # 草图12 → 切除-拉伸7 (cut)
    with BuildSketch(Plane.XY.offset(27.4)):
        with Locations((15.454813221, 4.141104722)):
            Circle(SKETCH_12_R)
        with Locations((-4.141104722, -15.454813221)):
            Circle(SKETCH_12_R)
        with Locations((-11.313708499, 11.313708499)):
            Circle(SKETCH_12_R)
    extrude(amount=-CUT_EXTRUDE_7_DEPTH, mode=Mode.SUBTRACT)


solid = part.part
